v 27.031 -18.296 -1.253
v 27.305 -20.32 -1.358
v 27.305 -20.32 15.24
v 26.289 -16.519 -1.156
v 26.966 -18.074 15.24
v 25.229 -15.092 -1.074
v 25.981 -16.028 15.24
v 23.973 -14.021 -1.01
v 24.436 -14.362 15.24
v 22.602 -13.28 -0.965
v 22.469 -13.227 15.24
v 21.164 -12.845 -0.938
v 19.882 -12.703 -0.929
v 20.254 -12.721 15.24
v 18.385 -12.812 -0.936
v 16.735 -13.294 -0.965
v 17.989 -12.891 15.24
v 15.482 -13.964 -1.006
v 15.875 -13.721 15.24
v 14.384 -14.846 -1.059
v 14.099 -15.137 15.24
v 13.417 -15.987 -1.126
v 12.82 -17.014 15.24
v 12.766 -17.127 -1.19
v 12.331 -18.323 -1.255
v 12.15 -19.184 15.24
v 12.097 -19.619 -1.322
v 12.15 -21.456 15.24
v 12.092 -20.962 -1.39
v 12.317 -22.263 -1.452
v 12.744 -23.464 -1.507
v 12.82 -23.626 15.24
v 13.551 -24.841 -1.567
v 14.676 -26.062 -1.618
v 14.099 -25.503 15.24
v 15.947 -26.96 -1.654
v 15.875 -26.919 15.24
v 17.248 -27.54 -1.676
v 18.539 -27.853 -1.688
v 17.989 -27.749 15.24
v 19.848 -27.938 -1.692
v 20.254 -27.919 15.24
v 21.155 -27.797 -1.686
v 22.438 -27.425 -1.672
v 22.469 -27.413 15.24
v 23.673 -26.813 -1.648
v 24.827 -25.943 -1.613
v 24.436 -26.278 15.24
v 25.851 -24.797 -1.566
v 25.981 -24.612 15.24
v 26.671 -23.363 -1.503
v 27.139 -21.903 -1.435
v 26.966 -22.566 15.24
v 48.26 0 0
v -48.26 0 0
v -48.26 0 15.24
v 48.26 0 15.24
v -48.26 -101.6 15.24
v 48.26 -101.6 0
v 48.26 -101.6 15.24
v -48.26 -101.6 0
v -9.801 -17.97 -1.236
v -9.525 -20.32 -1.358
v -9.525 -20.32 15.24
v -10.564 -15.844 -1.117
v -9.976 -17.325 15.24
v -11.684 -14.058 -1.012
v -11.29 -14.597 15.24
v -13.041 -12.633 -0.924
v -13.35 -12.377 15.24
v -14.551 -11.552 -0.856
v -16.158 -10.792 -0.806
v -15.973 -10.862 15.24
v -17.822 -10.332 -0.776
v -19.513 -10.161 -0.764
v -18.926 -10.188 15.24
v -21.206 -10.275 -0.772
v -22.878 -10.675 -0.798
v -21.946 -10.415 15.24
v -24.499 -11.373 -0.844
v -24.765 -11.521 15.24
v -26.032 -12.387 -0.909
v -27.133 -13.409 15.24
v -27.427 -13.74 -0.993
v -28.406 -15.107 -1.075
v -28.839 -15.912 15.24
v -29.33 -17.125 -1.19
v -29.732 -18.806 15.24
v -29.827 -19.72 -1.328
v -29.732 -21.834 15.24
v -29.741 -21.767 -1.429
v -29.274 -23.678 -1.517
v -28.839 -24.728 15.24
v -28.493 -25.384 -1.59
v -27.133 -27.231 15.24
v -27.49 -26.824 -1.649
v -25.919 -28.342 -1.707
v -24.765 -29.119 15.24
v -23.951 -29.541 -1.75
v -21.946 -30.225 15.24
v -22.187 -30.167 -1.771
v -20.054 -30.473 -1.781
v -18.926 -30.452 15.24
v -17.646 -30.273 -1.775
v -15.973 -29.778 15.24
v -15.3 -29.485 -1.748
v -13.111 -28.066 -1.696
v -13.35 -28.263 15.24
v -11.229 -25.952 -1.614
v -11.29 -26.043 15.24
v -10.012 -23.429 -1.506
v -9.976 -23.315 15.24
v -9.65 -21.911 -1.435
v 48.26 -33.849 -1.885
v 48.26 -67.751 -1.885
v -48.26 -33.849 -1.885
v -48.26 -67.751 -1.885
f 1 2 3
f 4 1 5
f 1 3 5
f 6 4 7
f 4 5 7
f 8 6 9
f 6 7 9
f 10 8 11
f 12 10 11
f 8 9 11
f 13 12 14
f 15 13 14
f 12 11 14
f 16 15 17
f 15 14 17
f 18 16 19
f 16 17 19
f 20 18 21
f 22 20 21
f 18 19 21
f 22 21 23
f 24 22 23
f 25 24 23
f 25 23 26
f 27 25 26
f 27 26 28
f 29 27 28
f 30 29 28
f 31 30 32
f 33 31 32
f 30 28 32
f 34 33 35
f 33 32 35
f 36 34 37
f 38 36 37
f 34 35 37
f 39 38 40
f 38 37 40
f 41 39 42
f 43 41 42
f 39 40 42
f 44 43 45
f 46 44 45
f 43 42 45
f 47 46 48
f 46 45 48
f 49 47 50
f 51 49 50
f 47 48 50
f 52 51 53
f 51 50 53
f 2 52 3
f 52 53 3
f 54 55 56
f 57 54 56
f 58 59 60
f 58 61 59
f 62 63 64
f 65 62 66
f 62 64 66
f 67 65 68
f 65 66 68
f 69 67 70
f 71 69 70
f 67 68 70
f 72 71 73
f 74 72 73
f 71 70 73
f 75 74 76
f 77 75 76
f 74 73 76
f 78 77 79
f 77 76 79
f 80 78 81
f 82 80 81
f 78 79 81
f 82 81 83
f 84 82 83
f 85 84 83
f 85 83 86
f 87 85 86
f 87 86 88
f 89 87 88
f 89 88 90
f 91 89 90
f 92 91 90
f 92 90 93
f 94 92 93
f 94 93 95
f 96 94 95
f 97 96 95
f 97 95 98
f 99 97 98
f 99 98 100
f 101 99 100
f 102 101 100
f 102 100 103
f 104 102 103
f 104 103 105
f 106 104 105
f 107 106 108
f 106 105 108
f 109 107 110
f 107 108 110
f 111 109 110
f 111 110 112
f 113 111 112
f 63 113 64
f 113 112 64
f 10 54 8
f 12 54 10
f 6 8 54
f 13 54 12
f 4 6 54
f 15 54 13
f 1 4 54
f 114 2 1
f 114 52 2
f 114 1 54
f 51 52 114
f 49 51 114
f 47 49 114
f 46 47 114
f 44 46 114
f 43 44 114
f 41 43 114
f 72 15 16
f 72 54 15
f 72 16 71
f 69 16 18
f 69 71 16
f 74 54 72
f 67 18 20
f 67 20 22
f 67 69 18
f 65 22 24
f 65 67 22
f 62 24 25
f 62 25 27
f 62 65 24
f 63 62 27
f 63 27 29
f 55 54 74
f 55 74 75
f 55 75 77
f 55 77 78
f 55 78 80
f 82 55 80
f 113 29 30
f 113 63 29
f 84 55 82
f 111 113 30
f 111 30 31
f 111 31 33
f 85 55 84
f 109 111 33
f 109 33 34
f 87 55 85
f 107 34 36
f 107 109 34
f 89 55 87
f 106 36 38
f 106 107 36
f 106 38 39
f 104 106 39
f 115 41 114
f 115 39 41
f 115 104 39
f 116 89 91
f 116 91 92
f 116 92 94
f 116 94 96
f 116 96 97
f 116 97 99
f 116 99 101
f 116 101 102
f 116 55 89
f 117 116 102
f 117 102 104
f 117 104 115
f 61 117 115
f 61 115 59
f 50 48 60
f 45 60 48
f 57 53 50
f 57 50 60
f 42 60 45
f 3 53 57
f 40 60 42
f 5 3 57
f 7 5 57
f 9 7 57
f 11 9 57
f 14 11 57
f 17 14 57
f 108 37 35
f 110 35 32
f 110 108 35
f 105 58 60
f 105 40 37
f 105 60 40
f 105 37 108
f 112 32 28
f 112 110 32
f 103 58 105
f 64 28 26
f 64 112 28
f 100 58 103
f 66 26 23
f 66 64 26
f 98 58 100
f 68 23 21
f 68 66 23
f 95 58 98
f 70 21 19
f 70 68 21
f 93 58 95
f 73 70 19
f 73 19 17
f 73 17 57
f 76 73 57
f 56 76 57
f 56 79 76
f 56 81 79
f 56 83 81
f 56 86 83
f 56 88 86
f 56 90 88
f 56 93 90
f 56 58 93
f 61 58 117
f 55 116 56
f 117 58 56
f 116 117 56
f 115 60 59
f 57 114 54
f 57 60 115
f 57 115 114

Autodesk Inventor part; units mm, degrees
ref_plane "YZ Plane" through (0, 0, 0) normal (1, 0, 0) x (0, 1, 0)
ref_plane "XZ Plane" through (0, 0, 0) normal (0, 1, 0) x (-1, 0, 0)
ref_plane "XY Plane" through (0, 0, 0) normal (0, 0, 1) x (1, 0, 0)
sketch "Sketch1" plane through (0, 0, 0) normal (1, 0, 0) x (0, 1, 0)
  line L0 (0, 0) -> (0, 15.24)
  line L1 (0, 0) -> (-101.6, 0) construction
  arc A0 (-101.6, 0) -> (0, 0) centre (-50.8, 607.4796) ccw
  line L2 (-50.8, -2.1204) -> (-50.8, 0) construction
  line L3 (0, 15.24) -> (101.6, 15.24) construction
  arc A1 (0, 15.24) -> (101.6, 15.24) centre (50.8, 622.7196) ccw construction
  line L4 (-101.6, 0) -> (-101.6, 15.24)
  line L5 (-101.6, 15.24) -> (0, 15.24)
  dimension "d0" = 15.24
  dimension "d1" = 101.6
  dimension "d3" = 50.8
  dimension "d4" = 2.1204
  dimension "d5" = 609.6
  dimension "d6" = 101.6
  dimension "d7" = 609.6
extrude "Extrusion1" add sketch "Sketch1" along normal mid plane 96.52
sketch "Sketch2" plane through (-48.26, -101.6, 15.24) normal (0, 0, 1) x (1, 0, 0)
  line L0 (48.26, 101.6) -> (48.26, 0) construction
  line L1 (0, 0) -> (96.52, 0) construction
  line L2 (0, 0) -> (0, 101.6) construction
  line L3 (0, 81.28) -> (96.52, 81.28) construction
  circle A0 centre (28.575, 81.28) radius 10.16
  circle A1 centre (67.945, 81.28) radius 7.62
  line L4 (0, 101.6) -> (96.52, 101.6) projected
  dimension "d11" = 20.32
  dimension "d12" = 15.24
  dimension "d13" = 57.15
  dimension "d14" = 19.685
  dimension "d20" = 20.32
extrude "Extrusion2" cut sketch "Sketch2" against normal through all
ref_plane "Work Plane1" through (-48.26, -20.32, 15.24) normal (0, 1, 0) x (1, 0, 0)
equation "\"d0\" = sidingDepth"
equation "\"d1\" = sidingHeight"
equation "\"d5\" = radiusOfCurvature"
equation "\"d6\" = sidingHeight"
equation "\"d7\" = radiusOfCurvature"
equation "\"d9\" = overallWidth"
equation "\"d11\" = leftPipeDiameter"
equation "\"d12\" = rightPipeDiameter"
equation "\"d13\" = outerDistanceBetweenPipep"
equation "\"d14\" = centerOfLeftPipe"
equation "\"d20\" = centerLineOfPipes"
equation "\"sidingHeight\" = 101.6"
equation "\"sidingDepth\" = 15.24"
equation "\"radiusOfCurvature\" = 609.6"
equation "\"centerLineOfPipes\" = 20.32"
equation "\"outerDistanceBetweenPipep\" = 57.15"
equation "\"leftPipeDiameter\" = 20.32"
equation "\"rightPipeDiameter\" = 15.24"
equation "\"overallWidth\" = 96.52"
equation "\"centerOfLeftPipe\" = 19.685"
equation "\"d21\" = -centerLineOfPipes"
properties part number "waterSoftenerDrainPipes"
